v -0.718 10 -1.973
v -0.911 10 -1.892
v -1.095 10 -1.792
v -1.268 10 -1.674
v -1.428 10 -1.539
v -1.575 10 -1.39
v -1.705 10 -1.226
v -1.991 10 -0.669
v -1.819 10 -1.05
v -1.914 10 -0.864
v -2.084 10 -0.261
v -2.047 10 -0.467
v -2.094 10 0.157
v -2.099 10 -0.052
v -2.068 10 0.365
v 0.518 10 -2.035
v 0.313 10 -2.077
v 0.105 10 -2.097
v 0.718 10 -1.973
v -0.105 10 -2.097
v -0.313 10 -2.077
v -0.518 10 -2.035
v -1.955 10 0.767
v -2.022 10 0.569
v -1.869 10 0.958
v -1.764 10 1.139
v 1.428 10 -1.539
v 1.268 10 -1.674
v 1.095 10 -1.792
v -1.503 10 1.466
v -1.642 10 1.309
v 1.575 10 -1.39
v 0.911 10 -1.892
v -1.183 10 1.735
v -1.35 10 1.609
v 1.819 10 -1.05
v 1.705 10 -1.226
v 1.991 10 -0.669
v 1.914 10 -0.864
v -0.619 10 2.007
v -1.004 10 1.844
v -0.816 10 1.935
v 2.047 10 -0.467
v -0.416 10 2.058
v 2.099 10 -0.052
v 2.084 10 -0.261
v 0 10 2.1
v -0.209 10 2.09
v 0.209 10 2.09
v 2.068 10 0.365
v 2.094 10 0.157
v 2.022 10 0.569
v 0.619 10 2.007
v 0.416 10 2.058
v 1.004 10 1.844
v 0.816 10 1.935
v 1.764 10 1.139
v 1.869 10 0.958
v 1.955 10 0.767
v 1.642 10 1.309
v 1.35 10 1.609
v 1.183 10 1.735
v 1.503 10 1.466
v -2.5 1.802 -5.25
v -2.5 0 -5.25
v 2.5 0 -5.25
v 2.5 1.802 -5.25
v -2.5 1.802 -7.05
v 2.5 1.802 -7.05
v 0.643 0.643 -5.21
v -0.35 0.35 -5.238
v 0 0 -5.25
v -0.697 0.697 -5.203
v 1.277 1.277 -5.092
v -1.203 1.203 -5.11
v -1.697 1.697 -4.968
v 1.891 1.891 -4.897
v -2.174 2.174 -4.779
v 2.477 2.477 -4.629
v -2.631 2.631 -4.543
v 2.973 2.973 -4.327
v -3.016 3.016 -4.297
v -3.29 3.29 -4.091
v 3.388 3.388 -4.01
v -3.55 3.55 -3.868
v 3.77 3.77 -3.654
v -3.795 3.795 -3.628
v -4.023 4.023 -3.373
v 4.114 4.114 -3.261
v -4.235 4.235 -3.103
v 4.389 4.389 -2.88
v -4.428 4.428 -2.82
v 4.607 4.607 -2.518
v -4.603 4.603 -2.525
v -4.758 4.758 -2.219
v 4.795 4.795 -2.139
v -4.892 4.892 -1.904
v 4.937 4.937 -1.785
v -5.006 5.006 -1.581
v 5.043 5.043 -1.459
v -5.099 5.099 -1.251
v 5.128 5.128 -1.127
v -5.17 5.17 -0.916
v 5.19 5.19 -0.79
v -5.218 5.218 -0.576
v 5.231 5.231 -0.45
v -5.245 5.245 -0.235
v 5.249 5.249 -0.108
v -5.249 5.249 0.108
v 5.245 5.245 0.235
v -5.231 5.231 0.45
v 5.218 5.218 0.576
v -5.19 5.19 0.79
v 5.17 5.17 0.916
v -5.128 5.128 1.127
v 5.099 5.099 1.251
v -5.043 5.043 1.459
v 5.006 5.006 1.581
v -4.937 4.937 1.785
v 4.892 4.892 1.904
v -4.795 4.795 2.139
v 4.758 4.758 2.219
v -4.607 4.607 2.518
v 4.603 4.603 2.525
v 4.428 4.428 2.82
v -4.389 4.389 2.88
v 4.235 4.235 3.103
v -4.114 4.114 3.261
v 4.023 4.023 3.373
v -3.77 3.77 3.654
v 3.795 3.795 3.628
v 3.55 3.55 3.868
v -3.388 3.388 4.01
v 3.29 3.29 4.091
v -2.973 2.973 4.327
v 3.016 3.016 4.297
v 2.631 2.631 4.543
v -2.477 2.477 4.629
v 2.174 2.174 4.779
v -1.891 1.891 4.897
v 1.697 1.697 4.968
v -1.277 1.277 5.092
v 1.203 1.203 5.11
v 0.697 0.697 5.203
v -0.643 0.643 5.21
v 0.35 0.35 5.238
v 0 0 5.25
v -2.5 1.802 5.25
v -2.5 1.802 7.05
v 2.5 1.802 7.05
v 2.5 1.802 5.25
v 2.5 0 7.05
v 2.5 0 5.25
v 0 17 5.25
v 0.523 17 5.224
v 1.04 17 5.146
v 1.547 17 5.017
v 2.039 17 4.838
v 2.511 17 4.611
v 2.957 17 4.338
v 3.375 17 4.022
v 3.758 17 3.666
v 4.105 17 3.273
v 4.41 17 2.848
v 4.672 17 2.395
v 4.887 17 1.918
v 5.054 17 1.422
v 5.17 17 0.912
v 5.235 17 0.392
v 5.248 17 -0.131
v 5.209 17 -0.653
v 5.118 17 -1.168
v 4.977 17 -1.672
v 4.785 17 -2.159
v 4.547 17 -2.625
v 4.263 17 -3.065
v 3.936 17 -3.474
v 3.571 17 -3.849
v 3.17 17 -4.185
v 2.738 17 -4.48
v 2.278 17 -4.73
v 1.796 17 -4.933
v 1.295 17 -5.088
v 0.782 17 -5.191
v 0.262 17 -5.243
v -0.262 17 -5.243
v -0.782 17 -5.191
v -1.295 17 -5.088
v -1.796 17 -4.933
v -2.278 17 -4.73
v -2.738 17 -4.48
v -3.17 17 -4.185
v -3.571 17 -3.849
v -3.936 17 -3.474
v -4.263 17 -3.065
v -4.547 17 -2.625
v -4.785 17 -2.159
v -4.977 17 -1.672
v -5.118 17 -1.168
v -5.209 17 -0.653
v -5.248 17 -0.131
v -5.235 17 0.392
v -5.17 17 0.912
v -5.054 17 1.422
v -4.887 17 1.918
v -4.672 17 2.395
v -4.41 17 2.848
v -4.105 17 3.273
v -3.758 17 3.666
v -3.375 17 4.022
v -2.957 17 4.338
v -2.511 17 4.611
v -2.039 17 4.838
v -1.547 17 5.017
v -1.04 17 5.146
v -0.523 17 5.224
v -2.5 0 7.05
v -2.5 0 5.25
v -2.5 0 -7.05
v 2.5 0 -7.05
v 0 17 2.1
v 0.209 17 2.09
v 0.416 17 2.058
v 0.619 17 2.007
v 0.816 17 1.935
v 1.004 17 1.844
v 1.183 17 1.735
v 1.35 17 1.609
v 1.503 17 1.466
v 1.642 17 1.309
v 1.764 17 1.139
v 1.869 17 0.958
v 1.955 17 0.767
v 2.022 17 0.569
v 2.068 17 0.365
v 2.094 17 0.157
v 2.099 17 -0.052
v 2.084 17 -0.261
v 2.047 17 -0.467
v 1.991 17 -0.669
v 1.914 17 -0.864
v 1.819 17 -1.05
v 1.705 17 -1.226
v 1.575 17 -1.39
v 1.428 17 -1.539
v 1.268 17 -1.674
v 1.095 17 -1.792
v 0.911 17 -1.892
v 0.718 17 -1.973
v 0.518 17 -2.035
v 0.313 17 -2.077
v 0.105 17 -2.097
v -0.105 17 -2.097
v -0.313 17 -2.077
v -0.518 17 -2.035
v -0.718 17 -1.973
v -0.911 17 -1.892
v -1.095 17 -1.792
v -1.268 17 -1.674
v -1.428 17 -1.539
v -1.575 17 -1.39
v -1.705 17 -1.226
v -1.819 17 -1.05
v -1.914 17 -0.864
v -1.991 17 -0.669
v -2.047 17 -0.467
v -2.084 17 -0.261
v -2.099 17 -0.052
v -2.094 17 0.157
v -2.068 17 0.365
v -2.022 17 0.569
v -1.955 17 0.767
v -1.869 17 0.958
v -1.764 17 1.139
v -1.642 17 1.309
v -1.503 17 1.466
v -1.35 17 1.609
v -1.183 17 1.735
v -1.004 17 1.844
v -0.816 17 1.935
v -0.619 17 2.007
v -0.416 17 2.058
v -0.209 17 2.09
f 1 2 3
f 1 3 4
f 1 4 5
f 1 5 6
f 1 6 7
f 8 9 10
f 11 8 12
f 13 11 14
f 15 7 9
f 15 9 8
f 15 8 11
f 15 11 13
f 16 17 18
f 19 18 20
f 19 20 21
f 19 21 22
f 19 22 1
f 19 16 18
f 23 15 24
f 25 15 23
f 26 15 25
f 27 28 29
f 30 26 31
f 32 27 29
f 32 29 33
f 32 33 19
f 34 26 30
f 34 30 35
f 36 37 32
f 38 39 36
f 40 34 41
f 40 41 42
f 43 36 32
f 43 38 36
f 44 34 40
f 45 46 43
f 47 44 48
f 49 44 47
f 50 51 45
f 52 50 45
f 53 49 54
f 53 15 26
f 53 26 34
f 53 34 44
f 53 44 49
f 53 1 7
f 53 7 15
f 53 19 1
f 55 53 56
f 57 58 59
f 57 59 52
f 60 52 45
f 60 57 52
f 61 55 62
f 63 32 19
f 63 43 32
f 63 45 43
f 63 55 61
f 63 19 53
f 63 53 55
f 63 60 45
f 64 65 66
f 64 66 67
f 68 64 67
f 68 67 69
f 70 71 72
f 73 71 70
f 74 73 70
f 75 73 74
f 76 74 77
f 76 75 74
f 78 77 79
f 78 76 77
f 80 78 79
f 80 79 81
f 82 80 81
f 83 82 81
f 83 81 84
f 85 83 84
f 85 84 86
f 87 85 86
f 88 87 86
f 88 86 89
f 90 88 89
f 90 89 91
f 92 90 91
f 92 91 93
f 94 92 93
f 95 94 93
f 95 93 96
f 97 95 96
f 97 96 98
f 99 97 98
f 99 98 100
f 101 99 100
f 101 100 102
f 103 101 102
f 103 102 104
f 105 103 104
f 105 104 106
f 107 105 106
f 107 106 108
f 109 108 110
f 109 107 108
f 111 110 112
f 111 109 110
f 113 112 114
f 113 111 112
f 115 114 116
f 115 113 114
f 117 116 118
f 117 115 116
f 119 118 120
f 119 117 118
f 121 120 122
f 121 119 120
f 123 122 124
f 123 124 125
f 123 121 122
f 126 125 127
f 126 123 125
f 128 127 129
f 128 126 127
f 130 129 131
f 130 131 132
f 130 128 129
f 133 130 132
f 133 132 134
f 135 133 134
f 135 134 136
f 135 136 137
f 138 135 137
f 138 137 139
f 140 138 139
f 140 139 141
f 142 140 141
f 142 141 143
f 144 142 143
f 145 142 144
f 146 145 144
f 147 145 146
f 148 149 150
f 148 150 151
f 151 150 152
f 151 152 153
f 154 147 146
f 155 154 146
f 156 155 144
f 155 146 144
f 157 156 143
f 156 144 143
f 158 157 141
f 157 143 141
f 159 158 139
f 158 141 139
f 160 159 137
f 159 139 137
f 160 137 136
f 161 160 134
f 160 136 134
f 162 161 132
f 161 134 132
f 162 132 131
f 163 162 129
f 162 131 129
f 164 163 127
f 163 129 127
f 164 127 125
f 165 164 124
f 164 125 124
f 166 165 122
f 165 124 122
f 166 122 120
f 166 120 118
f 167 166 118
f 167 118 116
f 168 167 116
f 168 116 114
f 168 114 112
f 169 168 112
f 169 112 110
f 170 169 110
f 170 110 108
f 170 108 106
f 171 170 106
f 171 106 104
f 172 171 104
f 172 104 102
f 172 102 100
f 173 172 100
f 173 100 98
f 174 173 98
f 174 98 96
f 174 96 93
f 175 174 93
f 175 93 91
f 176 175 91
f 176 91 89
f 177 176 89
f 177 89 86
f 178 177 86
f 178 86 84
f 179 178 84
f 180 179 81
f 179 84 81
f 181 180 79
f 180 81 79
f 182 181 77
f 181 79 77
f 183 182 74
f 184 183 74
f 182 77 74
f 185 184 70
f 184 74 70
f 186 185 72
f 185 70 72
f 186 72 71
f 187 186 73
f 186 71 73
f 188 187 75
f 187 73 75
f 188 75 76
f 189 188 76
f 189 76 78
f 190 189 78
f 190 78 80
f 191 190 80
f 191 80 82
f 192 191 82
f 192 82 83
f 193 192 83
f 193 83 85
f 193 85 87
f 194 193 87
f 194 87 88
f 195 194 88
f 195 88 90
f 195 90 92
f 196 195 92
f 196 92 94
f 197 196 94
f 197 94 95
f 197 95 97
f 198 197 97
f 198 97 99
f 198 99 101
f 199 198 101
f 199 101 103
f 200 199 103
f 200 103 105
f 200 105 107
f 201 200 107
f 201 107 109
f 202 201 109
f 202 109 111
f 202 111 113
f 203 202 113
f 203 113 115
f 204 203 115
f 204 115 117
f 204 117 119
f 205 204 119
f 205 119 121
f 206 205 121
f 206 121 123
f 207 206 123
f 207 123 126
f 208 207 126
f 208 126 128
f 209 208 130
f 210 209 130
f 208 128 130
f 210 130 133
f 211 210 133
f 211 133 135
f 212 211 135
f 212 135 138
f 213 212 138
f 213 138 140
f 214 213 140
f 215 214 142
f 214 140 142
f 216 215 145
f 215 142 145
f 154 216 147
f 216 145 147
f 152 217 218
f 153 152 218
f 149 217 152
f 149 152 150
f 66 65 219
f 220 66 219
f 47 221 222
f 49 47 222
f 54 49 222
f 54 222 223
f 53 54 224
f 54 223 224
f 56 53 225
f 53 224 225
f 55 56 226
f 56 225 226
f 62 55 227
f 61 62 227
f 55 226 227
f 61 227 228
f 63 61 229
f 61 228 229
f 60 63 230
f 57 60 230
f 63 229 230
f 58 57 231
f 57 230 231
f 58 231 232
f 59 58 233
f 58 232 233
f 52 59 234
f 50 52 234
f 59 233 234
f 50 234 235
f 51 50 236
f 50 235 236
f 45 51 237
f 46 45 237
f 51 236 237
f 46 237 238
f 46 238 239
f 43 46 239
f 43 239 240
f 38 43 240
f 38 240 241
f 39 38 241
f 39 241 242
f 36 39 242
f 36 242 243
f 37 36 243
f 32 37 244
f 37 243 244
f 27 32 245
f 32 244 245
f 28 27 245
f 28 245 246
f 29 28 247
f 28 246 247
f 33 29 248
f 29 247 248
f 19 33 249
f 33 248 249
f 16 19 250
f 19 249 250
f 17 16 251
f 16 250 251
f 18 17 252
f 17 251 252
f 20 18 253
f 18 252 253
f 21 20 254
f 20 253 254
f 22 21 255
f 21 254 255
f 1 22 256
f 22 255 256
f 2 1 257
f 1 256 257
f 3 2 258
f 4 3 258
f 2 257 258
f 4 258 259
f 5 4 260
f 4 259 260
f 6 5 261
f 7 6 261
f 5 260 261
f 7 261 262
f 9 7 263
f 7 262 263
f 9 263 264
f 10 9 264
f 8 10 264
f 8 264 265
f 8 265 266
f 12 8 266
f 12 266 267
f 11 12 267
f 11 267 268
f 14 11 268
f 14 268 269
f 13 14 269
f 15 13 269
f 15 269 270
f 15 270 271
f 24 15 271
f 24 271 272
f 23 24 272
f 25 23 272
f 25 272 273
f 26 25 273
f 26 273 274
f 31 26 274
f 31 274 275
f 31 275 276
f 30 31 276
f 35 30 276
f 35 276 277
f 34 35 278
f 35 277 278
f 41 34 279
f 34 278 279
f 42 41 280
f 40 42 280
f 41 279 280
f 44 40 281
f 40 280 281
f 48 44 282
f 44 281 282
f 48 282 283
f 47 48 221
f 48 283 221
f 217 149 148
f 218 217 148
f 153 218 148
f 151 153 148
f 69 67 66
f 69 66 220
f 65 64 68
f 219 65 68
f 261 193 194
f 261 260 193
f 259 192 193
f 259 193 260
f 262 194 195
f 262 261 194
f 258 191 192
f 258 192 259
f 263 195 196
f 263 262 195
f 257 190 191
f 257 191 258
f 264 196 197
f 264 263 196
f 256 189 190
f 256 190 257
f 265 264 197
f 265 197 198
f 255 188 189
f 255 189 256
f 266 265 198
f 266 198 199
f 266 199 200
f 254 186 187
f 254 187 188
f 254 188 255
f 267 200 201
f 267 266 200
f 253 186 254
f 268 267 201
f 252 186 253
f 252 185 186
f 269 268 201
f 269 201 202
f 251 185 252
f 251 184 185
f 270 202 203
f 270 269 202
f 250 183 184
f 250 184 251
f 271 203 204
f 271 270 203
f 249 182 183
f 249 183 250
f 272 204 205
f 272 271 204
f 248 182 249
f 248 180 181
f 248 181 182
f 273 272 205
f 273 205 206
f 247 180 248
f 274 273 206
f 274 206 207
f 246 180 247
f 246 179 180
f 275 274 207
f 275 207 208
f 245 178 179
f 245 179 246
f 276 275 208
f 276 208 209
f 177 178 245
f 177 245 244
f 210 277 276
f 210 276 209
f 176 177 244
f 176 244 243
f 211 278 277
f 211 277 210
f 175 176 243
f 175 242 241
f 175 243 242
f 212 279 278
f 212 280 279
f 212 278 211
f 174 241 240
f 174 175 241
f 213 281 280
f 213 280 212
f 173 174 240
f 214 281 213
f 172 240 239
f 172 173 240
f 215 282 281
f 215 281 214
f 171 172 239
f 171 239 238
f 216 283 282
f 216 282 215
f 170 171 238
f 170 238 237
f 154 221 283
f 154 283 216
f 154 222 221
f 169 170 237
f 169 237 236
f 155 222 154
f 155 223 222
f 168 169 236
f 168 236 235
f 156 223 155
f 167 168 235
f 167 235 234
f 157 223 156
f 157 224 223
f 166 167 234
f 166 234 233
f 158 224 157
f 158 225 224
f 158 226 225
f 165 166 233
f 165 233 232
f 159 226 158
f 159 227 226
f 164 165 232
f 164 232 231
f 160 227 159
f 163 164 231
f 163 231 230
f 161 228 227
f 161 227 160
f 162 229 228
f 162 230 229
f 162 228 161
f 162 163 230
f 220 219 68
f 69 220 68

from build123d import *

# Parameters (mm, degrees)
SKETCH2_R                  = 5.25
BOSS_EXTRUDE1_DEPTH        = 17
SKETCH3_R                  = 2.1
CUT_EXTRUDE1_DEPTH         = 7
CUT_EXTRUDE3_DEPTH         = 7
CUT_EXTRUDE3_DEPTH_BACK    = 7
SKETCH4_R                  = 5.25
BOSS_EXTRUDE2_DEPTH        = 2.5
BOSS_EXTRUDE2_DEPTH_BACK   = 2.5
SKETCH5_W                  = 1.8
SKETCH5_H                  = 1.802095862
BOSS_EXTRUDE2_2_DEPTH      = 2.5
BOSS_EXTRUDE2_2_DEPTH_BACK = 2.5


with BuildPart() as part:
    # Sketch2 → Boss-Extrude1 (new body)
    with BuildSketch(Plane(origin=(0, 0, 0), x_dir=(1, 0, 0), z_dir=(0, 1, 0))):
        Circle(SKETCH2_R)
    extrude(amount=BOSS_EXTRUDE1_DEPTH)

    # Sketch3 → Cut-Extrude1 (cut)
    with BuildSketch(Plane(origin=(0, 17, 0), x_dir=(1, 0, 0), z_dir=(0, 1, 0))):
        Circle(SKETCH3_R)
    extrude(amount=-CUT_EXTRUDE1_DEPTH, mode=Mode.SUBTRACT)

    # Sketch4 → Cut-Extrude3 (cut, two sides: drawn at the far end of the back side and taken through both)
    with BuildSketch(Plane(origin=(0, 0, 0), x_dir=(0, 0, -1), z_dir=(1, 0, 0)).offset(-CUT_EXTRUDE3_DEPTH_BACK)):
        Circle(SKETCH4_R)
    extrude(amount=CUT_EXTRUDE3_DEPTH + CUT_EXTRUDE3_DEPTH_BACK, mode=Mode.SUBTRACT)


with BuildPart() as body_2:
    # Sketch5 → Boss-Extrude2 (new, two sides: drawn at the far end of the back side and taken through both)
    with BuildSketch(Plane(origin=(0, 0, 0), x_dir=(0, 0, -1), z_dir=(1, 0, 0)).offset(-BOSS_EXTRUDE2_DEPTH_BACK)):
        with Locations((6.15, 0.901047931)):
            Rectangle(SKETCH5_W, SKETCH5_H)
    extrude(amount=BOSS_EXTRUDE2_DEPTH + BOSS_EXTRUDE2_DEPTH_BACK)


with BuildPart() as body_3:
    # Sketch5 → Boss-Extrude2 2 (new, two sides: drawn at the far end of the back side and taken through both)
    with BuildSketch(Plane(origin=(0, 0, 0), x_dir=(0, 0, -1), z_dir=(1, 0, 0)).offset(-BOSS_EXTRUDE2_2_DEPTH_BACK)):
        with Locations((-6.15, 0.901047931)):
            Rectangle(SKETCH5_W, SKETCH5_H)
    extrude(amount=BOSS_EXTRUDE2_2_DEPTH + BOSS_EXTRUDE2_2_DEPTH_BACK)


solid = Compound([part.part, body_2.part, body_3.part])
